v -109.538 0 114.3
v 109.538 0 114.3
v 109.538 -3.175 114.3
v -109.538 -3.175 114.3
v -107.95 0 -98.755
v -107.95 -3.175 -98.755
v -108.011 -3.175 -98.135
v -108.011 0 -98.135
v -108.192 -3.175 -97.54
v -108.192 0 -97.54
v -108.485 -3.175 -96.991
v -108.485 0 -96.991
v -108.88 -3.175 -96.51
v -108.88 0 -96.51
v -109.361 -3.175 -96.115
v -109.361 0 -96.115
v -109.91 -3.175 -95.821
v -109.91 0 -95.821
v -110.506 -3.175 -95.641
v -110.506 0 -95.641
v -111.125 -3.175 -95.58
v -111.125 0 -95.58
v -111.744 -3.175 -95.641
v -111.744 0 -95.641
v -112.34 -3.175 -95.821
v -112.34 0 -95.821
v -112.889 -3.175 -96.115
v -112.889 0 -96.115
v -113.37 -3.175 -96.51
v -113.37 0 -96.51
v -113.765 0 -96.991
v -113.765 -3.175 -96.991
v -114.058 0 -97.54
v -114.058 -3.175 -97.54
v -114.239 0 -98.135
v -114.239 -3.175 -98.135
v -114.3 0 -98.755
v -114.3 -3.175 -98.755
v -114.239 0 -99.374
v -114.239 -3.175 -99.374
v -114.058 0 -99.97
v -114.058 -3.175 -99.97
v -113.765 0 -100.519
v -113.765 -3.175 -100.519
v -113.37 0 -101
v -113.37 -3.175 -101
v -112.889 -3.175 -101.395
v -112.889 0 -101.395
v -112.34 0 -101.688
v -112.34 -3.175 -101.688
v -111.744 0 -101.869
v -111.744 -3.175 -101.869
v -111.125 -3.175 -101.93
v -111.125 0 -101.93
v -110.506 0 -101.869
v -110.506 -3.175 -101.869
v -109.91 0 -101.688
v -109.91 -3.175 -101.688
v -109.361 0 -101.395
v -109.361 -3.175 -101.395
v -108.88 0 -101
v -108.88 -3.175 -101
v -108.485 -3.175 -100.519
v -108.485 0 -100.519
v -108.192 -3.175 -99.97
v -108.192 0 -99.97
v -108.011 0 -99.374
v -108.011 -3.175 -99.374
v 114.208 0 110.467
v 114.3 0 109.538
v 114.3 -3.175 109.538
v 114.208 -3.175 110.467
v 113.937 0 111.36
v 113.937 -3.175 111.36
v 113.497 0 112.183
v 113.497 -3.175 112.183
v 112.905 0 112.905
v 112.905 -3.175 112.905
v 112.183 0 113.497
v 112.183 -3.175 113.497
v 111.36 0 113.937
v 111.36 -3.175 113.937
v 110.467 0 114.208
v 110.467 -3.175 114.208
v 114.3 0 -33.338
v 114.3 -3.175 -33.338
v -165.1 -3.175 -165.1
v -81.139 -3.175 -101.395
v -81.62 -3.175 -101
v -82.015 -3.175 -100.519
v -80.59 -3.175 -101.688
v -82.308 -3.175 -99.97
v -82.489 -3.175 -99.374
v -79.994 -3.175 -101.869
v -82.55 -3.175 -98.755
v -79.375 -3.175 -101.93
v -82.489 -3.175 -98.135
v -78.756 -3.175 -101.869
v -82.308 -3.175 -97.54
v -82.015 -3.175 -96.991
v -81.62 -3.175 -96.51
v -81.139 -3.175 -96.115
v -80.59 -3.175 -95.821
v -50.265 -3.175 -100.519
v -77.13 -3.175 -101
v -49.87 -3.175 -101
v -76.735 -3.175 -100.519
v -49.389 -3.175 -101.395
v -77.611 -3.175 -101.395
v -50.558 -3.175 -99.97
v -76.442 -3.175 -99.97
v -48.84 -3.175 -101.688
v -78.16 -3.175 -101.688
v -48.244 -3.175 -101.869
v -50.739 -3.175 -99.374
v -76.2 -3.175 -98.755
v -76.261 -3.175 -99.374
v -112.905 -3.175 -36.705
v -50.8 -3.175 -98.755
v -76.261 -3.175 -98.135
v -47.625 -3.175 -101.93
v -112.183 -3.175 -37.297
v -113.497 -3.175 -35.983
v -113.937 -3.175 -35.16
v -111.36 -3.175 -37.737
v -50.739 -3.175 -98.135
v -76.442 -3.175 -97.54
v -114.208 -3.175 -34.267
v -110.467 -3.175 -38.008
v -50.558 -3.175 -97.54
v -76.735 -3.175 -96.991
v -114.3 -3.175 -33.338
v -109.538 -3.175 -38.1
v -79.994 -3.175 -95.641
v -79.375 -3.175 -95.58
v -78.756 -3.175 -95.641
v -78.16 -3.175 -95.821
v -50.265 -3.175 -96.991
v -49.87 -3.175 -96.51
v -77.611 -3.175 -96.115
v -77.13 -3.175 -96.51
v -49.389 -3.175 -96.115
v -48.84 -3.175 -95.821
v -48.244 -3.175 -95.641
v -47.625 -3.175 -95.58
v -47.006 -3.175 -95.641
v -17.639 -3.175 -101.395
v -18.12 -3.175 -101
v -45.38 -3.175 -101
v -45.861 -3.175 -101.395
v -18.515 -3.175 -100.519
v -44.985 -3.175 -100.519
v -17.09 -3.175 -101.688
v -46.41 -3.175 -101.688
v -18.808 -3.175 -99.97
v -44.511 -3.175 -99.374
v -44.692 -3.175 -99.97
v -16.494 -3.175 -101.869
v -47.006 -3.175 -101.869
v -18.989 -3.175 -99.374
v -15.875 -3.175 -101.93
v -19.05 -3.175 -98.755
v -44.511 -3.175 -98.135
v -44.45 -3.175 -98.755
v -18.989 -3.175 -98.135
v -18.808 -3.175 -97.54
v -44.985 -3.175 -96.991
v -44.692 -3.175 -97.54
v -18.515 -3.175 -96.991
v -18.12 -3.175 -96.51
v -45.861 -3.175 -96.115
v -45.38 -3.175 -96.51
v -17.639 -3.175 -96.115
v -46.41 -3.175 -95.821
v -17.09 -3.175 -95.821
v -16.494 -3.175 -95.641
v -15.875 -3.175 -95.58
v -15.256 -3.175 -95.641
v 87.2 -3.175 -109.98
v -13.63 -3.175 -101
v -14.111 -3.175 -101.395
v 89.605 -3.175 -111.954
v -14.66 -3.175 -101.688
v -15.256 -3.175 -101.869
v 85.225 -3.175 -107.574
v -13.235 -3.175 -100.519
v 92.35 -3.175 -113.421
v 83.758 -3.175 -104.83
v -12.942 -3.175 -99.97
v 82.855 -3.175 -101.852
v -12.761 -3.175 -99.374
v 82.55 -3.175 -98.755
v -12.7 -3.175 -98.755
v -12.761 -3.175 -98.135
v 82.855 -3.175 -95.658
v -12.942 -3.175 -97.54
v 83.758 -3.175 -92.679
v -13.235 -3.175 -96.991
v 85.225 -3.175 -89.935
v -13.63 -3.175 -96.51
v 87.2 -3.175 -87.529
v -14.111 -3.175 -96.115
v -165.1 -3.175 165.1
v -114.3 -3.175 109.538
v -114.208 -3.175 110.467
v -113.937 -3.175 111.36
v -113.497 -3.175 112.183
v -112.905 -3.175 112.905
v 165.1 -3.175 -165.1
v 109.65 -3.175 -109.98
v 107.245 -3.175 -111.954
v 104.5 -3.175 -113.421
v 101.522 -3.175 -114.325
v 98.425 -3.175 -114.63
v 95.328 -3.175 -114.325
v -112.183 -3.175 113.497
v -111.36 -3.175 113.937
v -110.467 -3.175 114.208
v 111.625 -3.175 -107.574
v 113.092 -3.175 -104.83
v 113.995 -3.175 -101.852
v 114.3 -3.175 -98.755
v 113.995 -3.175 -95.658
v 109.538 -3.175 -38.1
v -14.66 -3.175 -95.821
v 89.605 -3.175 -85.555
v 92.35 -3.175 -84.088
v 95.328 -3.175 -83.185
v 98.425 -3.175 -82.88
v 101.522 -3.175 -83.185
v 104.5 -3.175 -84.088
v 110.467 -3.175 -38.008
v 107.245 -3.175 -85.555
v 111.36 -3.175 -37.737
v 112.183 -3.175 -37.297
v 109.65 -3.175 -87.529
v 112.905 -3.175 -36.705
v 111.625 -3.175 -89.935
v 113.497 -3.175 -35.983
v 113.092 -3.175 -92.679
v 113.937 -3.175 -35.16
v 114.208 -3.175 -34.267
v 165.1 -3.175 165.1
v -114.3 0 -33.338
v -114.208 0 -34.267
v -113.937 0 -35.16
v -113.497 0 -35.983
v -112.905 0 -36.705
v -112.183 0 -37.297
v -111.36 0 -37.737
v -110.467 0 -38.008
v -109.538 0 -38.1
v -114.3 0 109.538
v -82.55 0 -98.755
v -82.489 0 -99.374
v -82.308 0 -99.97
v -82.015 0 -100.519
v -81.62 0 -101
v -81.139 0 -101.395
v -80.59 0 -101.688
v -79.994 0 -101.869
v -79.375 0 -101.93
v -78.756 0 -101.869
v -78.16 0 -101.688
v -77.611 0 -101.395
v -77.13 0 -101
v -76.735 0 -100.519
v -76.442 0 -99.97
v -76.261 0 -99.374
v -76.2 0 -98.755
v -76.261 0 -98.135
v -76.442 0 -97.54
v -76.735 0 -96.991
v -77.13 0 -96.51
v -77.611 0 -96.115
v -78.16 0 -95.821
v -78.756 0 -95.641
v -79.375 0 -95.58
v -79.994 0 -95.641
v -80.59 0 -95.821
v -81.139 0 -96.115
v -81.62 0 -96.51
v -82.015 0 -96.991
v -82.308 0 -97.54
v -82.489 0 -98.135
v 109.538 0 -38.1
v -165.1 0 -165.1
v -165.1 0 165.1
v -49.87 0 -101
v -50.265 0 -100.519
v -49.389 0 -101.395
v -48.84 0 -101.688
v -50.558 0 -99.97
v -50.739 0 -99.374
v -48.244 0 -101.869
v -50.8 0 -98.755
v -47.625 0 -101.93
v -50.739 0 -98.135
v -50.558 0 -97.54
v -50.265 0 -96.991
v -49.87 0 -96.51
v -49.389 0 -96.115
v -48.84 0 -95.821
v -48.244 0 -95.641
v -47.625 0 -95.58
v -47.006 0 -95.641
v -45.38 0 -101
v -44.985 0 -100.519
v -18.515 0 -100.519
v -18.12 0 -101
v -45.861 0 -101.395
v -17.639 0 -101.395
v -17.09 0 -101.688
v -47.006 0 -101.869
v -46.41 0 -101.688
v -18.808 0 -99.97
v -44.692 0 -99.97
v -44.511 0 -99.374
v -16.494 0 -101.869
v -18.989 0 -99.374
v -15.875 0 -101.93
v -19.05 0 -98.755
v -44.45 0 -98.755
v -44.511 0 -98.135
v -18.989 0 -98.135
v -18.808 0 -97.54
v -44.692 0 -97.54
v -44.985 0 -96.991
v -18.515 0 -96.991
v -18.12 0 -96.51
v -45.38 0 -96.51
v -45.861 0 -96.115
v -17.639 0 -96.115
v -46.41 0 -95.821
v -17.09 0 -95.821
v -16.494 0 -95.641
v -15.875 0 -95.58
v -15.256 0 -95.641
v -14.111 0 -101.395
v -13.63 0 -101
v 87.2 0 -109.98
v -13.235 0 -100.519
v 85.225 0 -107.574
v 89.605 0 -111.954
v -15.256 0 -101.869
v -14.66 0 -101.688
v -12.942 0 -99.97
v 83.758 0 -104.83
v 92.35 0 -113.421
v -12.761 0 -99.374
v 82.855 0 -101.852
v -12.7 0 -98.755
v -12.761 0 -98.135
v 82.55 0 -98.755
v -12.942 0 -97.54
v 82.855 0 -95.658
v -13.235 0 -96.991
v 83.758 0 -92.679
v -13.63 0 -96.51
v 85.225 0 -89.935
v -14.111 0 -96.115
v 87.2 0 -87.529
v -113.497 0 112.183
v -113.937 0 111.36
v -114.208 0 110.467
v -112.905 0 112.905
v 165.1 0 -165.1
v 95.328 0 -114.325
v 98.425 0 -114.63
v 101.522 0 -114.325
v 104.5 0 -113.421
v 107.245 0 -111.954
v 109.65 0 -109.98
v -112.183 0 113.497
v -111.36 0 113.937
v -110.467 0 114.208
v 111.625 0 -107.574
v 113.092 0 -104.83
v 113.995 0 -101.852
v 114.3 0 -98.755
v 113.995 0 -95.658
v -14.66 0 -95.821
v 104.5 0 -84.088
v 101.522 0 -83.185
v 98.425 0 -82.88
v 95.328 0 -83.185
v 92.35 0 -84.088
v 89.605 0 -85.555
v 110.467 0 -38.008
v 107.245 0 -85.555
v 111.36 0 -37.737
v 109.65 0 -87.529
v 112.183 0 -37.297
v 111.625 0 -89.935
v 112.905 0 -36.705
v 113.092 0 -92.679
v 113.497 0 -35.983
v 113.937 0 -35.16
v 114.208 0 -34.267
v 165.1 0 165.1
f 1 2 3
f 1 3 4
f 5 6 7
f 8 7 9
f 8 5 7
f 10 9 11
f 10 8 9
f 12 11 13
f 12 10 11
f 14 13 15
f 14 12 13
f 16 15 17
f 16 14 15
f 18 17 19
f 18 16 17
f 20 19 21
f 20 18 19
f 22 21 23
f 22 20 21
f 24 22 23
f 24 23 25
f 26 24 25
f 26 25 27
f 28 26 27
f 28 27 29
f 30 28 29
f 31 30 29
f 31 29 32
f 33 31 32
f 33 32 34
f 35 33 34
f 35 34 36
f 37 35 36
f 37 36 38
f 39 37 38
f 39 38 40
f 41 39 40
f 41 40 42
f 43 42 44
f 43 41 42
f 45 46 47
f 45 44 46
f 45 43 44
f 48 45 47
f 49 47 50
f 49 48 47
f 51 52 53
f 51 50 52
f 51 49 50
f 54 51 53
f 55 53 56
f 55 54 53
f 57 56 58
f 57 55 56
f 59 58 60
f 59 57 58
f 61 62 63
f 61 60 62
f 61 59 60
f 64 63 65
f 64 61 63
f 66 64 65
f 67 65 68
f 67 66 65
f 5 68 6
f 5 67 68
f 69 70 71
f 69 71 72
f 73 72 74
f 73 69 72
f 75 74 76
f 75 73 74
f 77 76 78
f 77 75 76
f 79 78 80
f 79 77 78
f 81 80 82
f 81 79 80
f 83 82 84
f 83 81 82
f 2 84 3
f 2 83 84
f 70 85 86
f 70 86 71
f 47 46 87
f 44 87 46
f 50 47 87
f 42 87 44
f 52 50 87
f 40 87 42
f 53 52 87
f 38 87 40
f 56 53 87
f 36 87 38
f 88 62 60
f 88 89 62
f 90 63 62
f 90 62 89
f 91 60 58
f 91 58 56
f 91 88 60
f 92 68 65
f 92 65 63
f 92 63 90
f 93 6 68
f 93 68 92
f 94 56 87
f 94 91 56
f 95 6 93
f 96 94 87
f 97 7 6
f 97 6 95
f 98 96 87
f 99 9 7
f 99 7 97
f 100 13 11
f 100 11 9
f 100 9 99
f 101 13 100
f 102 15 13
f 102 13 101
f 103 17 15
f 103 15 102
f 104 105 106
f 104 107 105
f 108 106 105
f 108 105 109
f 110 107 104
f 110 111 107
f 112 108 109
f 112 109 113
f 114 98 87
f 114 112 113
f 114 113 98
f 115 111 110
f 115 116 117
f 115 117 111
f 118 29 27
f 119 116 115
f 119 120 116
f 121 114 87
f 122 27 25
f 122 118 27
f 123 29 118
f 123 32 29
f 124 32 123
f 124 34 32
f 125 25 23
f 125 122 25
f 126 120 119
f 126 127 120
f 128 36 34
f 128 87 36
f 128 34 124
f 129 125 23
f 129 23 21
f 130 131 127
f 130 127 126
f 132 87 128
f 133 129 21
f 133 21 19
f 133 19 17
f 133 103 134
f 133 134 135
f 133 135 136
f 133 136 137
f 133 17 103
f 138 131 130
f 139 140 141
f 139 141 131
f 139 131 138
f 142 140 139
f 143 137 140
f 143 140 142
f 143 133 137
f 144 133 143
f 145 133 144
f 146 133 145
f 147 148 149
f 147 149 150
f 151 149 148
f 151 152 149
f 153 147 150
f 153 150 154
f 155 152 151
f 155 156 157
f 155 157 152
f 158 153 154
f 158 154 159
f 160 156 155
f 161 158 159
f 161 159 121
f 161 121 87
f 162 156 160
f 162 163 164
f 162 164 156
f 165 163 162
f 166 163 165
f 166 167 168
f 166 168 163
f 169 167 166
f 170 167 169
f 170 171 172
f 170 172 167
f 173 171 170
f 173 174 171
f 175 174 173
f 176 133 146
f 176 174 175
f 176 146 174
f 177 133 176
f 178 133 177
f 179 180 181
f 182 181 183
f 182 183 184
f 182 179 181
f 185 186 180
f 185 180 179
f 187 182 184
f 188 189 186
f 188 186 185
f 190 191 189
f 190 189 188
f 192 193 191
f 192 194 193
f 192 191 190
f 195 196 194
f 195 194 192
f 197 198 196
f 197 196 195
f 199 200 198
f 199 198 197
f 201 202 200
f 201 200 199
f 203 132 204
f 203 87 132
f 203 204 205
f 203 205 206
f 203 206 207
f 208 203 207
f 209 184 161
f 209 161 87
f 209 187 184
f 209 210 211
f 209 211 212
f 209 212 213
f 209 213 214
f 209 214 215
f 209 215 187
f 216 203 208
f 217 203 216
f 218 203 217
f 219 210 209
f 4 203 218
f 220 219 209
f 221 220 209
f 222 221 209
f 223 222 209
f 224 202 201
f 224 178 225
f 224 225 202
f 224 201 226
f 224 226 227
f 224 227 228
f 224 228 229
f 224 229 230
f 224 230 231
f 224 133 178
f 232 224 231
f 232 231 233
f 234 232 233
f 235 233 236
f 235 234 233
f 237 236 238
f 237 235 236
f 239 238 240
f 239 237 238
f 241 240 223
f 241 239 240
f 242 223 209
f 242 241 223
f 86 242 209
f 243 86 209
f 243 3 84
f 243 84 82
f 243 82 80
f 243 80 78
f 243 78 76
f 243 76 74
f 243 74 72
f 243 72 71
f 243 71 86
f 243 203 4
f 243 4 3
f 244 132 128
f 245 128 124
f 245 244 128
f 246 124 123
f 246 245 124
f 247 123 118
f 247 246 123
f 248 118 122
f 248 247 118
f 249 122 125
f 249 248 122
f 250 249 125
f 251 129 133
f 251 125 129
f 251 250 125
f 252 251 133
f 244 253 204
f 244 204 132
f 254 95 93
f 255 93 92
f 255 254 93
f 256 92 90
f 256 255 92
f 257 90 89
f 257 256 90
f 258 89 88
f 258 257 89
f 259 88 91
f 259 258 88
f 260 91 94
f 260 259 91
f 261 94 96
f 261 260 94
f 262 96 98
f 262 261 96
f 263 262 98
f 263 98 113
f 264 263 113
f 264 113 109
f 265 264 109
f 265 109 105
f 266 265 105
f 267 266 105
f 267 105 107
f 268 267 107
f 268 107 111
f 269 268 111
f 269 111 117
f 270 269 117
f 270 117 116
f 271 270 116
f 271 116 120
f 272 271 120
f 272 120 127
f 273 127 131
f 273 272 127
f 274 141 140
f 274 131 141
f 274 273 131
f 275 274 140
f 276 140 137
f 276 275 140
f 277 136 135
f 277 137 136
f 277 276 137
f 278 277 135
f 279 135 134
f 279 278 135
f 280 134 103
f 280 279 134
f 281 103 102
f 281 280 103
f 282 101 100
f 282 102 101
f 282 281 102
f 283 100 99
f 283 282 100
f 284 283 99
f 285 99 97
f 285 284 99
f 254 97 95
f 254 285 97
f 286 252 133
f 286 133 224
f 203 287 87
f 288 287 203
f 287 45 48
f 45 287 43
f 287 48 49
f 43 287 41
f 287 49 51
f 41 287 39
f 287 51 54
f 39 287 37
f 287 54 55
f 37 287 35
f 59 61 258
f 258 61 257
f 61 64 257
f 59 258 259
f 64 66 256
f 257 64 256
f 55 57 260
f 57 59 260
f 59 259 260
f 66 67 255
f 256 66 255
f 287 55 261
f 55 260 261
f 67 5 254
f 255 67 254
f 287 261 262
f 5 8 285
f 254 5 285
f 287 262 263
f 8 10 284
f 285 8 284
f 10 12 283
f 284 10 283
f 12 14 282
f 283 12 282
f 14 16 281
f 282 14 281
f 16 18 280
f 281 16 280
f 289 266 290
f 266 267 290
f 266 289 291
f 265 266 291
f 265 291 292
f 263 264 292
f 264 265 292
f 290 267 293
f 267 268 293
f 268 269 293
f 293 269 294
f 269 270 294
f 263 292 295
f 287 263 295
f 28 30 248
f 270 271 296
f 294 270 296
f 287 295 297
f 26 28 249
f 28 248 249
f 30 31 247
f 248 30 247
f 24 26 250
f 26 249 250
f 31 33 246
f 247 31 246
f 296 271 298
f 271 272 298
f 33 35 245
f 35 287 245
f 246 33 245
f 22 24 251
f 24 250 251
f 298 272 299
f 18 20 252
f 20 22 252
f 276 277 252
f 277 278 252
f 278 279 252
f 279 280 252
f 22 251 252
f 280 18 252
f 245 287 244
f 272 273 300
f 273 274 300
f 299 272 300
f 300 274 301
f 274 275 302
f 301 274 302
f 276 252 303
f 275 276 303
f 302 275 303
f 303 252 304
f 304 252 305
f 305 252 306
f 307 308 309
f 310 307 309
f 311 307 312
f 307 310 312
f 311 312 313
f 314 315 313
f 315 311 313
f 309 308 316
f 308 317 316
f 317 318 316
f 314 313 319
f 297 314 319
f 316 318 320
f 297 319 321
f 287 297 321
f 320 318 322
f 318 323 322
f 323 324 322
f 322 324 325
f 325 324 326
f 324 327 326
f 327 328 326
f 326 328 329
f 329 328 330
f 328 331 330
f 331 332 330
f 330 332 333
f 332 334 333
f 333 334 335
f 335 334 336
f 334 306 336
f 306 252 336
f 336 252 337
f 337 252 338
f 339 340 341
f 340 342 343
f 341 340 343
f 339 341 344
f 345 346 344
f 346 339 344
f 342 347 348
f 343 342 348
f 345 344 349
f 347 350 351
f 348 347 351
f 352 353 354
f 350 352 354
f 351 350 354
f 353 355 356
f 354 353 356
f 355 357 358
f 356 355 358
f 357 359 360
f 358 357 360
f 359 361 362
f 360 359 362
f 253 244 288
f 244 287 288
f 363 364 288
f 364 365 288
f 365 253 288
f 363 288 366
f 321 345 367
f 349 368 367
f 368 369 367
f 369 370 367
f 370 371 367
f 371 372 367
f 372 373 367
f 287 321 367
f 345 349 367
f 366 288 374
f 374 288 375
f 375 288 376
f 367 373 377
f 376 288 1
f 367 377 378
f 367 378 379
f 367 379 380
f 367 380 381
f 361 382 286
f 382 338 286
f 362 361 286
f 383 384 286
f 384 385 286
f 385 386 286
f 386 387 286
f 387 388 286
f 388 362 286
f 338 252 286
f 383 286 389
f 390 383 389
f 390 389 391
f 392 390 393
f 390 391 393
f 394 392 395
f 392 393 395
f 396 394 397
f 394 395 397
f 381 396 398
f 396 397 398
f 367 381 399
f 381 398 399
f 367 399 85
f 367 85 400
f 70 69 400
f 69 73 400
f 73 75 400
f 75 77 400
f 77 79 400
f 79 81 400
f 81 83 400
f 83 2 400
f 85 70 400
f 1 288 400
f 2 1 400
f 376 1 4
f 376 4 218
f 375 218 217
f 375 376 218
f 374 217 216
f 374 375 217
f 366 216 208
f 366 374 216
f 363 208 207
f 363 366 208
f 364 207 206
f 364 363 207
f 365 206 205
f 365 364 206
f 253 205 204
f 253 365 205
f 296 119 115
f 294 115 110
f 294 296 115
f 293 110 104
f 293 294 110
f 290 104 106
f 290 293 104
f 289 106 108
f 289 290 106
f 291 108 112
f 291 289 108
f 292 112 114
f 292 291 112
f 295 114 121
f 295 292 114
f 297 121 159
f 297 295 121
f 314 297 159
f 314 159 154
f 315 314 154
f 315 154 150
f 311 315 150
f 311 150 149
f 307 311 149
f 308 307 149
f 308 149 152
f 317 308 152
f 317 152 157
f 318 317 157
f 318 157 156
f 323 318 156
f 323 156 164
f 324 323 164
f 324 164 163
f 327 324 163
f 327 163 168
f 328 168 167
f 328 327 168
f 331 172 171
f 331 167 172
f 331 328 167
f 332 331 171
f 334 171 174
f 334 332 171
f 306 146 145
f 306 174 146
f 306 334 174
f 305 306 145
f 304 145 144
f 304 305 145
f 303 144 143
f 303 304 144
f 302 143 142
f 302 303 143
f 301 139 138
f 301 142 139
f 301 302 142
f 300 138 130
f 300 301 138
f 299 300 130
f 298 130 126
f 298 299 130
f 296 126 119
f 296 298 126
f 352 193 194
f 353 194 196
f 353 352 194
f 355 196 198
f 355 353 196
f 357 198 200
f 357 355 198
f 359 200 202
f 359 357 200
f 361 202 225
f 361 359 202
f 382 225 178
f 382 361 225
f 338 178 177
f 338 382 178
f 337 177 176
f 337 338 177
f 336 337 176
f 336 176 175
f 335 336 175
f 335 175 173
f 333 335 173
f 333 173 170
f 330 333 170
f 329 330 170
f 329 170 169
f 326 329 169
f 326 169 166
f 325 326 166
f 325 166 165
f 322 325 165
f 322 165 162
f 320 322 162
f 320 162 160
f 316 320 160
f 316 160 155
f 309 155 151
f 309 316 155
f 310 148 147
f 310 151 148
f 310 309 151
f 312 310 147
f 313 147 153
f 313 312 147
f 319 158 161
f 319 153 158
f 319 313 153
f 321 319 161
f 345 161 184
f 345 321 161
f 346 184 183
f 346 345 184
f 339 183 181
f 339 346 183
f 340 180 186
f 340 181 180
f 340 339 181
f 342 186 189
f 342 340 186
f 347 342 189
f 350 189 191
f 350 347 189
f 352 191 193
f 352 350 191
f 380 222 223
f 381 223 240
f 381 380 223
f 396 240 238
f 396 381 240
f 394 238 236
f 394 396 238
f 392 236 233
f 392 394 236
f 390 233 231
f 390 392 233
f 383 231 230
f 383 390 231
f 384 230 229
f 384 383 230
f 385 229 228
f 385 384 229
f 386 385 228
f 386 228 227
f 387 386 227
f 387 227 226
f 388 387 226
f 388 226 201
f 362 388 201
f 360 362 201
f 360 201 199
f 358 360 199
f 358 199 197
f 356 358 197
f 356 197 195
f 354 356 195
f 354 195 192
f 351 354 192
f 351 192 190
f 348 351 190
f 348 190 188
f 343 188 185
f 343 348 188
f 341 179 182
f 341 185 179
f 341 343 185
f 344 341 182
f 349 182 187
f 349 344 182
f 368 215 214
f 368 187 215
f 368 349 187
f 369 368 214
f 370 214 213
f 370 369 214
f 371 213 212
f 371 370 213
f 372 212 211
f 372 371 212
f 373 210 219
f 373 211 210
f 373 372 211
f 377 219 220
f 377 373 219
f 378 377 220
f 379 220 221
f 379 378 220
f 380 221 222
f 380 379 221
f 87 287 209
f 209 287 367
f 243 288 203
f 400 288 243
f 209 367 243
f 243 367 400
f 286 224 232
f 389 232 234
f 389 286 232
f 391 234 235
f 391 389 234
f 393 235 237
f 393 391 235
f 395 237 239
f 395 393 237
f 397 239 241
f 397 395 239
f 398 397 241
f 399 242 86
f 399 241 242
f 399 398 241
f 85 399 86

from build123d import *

# Parameters (mm, degrees)
F0_W     = 330.2
F0_H     = 330.2
F3_DEPTH = 3.175
F4_DEPTH = 25.4


with BuildPart() as f3:
    # F0 (on Front) → F3 (new body)
    with BuildSketch(Plane.XZ):
        Rectangle(F0_W, F0_H)
    extrude(amount=F3_DEPTH)

    # F1 (on face) + F2 (on face) → F4 (cut)
    with BuildSketch(Plane.XZ):
        with BuildLine():
            ThreePointArc((-114.3, -33.3375), (-112.905096, -36.705096), (-109.5375, -38.1))
            Line((-109.5375, -38.1), (109.5375, -38.1))
            ThreePointArc((109.5375, -38.1), (112.905096, -36.705096), (114.3, -33.3375))
            Line((114.3, -33.3375), (114.3, 109.5375))
            ThreePointArc((114.3, 109.5375), (112.905096, 112.905096), (109.5375, 114.3))
            Line((109.5375, 114.3), (-109.5375, 114.3))
            ThreePointArc((-109.5375, 114.3), (-112.905096, 112.905096), (-114.3, 109.5375))
            Line((-114.3, 109.5375), (-114.3, -33.3375))
        make_face()
    with BuildSketch(Plane.XZ):
        with BuildLine():
            ThreePointArc((82.55, -98.754585), (98.425, -114.629585), (114.3, -98.754585))
            ThreePointArc((114.3, -98.754585), (98.425, -82.879585), (82.55, -98.754585))
        make_face()
        with BuildLine():
            ThreePointArc((-19.05, -98.754585), (-15.875, -101.929585), (-12.7, -98.754585))
            Line((-12.7, -98.754585), (-19.05, -98.754585))
        make_face()
        with BuildLine():
            Line((-19.05, -98.754585), (-12.7, -98.754585))
            ThreePointArc((-12.7, -98.754585), (-15.875, -95.579585), (-19.05, -98.754585))
        make_face()
        with BuildLine():
            Line((-50.8, -98.754585), (-44.45, -98.754585))
            ThreePointArc((-44.45, -98.754585), (-47.625, -95.579585), (-50.8, -98.754585))
        make_face()
        with BuildLine():
            ThreePointArc((-50.8, -98.754585), (-47.625, -101.929585), (-44.45, -98.754585))
            Line((-44.45, -98.754585), (-50.8, -98.754585))
        make_face()
        with BuildLine():
            Line((-82.55, -98.754585), (-76.2, -98.754585))
            ThreePointArc((-76.2, -98.754585), (-79.375, -95.579585), (-82.55, -98.754585))
        make_face()
        with BuildLine():
            ThreePointArc((-82.55, -98.754585), (-79.375, -101.929585), (-76.2, -98.754585))
            Line((-76.2, -98.754585), (-82.55, -98.754585))
        make_face()
        with BuildLine():
            ThreePointArc((-114.3, -98.754585), (-111.125, -101.929585), (-107.95, -98.754585))
            Line((-107.95, -98.754585), (-114.3, -98.754585))
        make_face()
        with BuildLine():
            Line((-114.3, -98.754585), (-107.95, -98.754585))
            ThreePointArc((-107.95, -98.754585), (-111.125, -95.579585), (-114.3, -98.754585))
        make_face()
    extrude(amount=F4_DEPTH, mode=Mode.SUBTRACT)


solid = f3.part
